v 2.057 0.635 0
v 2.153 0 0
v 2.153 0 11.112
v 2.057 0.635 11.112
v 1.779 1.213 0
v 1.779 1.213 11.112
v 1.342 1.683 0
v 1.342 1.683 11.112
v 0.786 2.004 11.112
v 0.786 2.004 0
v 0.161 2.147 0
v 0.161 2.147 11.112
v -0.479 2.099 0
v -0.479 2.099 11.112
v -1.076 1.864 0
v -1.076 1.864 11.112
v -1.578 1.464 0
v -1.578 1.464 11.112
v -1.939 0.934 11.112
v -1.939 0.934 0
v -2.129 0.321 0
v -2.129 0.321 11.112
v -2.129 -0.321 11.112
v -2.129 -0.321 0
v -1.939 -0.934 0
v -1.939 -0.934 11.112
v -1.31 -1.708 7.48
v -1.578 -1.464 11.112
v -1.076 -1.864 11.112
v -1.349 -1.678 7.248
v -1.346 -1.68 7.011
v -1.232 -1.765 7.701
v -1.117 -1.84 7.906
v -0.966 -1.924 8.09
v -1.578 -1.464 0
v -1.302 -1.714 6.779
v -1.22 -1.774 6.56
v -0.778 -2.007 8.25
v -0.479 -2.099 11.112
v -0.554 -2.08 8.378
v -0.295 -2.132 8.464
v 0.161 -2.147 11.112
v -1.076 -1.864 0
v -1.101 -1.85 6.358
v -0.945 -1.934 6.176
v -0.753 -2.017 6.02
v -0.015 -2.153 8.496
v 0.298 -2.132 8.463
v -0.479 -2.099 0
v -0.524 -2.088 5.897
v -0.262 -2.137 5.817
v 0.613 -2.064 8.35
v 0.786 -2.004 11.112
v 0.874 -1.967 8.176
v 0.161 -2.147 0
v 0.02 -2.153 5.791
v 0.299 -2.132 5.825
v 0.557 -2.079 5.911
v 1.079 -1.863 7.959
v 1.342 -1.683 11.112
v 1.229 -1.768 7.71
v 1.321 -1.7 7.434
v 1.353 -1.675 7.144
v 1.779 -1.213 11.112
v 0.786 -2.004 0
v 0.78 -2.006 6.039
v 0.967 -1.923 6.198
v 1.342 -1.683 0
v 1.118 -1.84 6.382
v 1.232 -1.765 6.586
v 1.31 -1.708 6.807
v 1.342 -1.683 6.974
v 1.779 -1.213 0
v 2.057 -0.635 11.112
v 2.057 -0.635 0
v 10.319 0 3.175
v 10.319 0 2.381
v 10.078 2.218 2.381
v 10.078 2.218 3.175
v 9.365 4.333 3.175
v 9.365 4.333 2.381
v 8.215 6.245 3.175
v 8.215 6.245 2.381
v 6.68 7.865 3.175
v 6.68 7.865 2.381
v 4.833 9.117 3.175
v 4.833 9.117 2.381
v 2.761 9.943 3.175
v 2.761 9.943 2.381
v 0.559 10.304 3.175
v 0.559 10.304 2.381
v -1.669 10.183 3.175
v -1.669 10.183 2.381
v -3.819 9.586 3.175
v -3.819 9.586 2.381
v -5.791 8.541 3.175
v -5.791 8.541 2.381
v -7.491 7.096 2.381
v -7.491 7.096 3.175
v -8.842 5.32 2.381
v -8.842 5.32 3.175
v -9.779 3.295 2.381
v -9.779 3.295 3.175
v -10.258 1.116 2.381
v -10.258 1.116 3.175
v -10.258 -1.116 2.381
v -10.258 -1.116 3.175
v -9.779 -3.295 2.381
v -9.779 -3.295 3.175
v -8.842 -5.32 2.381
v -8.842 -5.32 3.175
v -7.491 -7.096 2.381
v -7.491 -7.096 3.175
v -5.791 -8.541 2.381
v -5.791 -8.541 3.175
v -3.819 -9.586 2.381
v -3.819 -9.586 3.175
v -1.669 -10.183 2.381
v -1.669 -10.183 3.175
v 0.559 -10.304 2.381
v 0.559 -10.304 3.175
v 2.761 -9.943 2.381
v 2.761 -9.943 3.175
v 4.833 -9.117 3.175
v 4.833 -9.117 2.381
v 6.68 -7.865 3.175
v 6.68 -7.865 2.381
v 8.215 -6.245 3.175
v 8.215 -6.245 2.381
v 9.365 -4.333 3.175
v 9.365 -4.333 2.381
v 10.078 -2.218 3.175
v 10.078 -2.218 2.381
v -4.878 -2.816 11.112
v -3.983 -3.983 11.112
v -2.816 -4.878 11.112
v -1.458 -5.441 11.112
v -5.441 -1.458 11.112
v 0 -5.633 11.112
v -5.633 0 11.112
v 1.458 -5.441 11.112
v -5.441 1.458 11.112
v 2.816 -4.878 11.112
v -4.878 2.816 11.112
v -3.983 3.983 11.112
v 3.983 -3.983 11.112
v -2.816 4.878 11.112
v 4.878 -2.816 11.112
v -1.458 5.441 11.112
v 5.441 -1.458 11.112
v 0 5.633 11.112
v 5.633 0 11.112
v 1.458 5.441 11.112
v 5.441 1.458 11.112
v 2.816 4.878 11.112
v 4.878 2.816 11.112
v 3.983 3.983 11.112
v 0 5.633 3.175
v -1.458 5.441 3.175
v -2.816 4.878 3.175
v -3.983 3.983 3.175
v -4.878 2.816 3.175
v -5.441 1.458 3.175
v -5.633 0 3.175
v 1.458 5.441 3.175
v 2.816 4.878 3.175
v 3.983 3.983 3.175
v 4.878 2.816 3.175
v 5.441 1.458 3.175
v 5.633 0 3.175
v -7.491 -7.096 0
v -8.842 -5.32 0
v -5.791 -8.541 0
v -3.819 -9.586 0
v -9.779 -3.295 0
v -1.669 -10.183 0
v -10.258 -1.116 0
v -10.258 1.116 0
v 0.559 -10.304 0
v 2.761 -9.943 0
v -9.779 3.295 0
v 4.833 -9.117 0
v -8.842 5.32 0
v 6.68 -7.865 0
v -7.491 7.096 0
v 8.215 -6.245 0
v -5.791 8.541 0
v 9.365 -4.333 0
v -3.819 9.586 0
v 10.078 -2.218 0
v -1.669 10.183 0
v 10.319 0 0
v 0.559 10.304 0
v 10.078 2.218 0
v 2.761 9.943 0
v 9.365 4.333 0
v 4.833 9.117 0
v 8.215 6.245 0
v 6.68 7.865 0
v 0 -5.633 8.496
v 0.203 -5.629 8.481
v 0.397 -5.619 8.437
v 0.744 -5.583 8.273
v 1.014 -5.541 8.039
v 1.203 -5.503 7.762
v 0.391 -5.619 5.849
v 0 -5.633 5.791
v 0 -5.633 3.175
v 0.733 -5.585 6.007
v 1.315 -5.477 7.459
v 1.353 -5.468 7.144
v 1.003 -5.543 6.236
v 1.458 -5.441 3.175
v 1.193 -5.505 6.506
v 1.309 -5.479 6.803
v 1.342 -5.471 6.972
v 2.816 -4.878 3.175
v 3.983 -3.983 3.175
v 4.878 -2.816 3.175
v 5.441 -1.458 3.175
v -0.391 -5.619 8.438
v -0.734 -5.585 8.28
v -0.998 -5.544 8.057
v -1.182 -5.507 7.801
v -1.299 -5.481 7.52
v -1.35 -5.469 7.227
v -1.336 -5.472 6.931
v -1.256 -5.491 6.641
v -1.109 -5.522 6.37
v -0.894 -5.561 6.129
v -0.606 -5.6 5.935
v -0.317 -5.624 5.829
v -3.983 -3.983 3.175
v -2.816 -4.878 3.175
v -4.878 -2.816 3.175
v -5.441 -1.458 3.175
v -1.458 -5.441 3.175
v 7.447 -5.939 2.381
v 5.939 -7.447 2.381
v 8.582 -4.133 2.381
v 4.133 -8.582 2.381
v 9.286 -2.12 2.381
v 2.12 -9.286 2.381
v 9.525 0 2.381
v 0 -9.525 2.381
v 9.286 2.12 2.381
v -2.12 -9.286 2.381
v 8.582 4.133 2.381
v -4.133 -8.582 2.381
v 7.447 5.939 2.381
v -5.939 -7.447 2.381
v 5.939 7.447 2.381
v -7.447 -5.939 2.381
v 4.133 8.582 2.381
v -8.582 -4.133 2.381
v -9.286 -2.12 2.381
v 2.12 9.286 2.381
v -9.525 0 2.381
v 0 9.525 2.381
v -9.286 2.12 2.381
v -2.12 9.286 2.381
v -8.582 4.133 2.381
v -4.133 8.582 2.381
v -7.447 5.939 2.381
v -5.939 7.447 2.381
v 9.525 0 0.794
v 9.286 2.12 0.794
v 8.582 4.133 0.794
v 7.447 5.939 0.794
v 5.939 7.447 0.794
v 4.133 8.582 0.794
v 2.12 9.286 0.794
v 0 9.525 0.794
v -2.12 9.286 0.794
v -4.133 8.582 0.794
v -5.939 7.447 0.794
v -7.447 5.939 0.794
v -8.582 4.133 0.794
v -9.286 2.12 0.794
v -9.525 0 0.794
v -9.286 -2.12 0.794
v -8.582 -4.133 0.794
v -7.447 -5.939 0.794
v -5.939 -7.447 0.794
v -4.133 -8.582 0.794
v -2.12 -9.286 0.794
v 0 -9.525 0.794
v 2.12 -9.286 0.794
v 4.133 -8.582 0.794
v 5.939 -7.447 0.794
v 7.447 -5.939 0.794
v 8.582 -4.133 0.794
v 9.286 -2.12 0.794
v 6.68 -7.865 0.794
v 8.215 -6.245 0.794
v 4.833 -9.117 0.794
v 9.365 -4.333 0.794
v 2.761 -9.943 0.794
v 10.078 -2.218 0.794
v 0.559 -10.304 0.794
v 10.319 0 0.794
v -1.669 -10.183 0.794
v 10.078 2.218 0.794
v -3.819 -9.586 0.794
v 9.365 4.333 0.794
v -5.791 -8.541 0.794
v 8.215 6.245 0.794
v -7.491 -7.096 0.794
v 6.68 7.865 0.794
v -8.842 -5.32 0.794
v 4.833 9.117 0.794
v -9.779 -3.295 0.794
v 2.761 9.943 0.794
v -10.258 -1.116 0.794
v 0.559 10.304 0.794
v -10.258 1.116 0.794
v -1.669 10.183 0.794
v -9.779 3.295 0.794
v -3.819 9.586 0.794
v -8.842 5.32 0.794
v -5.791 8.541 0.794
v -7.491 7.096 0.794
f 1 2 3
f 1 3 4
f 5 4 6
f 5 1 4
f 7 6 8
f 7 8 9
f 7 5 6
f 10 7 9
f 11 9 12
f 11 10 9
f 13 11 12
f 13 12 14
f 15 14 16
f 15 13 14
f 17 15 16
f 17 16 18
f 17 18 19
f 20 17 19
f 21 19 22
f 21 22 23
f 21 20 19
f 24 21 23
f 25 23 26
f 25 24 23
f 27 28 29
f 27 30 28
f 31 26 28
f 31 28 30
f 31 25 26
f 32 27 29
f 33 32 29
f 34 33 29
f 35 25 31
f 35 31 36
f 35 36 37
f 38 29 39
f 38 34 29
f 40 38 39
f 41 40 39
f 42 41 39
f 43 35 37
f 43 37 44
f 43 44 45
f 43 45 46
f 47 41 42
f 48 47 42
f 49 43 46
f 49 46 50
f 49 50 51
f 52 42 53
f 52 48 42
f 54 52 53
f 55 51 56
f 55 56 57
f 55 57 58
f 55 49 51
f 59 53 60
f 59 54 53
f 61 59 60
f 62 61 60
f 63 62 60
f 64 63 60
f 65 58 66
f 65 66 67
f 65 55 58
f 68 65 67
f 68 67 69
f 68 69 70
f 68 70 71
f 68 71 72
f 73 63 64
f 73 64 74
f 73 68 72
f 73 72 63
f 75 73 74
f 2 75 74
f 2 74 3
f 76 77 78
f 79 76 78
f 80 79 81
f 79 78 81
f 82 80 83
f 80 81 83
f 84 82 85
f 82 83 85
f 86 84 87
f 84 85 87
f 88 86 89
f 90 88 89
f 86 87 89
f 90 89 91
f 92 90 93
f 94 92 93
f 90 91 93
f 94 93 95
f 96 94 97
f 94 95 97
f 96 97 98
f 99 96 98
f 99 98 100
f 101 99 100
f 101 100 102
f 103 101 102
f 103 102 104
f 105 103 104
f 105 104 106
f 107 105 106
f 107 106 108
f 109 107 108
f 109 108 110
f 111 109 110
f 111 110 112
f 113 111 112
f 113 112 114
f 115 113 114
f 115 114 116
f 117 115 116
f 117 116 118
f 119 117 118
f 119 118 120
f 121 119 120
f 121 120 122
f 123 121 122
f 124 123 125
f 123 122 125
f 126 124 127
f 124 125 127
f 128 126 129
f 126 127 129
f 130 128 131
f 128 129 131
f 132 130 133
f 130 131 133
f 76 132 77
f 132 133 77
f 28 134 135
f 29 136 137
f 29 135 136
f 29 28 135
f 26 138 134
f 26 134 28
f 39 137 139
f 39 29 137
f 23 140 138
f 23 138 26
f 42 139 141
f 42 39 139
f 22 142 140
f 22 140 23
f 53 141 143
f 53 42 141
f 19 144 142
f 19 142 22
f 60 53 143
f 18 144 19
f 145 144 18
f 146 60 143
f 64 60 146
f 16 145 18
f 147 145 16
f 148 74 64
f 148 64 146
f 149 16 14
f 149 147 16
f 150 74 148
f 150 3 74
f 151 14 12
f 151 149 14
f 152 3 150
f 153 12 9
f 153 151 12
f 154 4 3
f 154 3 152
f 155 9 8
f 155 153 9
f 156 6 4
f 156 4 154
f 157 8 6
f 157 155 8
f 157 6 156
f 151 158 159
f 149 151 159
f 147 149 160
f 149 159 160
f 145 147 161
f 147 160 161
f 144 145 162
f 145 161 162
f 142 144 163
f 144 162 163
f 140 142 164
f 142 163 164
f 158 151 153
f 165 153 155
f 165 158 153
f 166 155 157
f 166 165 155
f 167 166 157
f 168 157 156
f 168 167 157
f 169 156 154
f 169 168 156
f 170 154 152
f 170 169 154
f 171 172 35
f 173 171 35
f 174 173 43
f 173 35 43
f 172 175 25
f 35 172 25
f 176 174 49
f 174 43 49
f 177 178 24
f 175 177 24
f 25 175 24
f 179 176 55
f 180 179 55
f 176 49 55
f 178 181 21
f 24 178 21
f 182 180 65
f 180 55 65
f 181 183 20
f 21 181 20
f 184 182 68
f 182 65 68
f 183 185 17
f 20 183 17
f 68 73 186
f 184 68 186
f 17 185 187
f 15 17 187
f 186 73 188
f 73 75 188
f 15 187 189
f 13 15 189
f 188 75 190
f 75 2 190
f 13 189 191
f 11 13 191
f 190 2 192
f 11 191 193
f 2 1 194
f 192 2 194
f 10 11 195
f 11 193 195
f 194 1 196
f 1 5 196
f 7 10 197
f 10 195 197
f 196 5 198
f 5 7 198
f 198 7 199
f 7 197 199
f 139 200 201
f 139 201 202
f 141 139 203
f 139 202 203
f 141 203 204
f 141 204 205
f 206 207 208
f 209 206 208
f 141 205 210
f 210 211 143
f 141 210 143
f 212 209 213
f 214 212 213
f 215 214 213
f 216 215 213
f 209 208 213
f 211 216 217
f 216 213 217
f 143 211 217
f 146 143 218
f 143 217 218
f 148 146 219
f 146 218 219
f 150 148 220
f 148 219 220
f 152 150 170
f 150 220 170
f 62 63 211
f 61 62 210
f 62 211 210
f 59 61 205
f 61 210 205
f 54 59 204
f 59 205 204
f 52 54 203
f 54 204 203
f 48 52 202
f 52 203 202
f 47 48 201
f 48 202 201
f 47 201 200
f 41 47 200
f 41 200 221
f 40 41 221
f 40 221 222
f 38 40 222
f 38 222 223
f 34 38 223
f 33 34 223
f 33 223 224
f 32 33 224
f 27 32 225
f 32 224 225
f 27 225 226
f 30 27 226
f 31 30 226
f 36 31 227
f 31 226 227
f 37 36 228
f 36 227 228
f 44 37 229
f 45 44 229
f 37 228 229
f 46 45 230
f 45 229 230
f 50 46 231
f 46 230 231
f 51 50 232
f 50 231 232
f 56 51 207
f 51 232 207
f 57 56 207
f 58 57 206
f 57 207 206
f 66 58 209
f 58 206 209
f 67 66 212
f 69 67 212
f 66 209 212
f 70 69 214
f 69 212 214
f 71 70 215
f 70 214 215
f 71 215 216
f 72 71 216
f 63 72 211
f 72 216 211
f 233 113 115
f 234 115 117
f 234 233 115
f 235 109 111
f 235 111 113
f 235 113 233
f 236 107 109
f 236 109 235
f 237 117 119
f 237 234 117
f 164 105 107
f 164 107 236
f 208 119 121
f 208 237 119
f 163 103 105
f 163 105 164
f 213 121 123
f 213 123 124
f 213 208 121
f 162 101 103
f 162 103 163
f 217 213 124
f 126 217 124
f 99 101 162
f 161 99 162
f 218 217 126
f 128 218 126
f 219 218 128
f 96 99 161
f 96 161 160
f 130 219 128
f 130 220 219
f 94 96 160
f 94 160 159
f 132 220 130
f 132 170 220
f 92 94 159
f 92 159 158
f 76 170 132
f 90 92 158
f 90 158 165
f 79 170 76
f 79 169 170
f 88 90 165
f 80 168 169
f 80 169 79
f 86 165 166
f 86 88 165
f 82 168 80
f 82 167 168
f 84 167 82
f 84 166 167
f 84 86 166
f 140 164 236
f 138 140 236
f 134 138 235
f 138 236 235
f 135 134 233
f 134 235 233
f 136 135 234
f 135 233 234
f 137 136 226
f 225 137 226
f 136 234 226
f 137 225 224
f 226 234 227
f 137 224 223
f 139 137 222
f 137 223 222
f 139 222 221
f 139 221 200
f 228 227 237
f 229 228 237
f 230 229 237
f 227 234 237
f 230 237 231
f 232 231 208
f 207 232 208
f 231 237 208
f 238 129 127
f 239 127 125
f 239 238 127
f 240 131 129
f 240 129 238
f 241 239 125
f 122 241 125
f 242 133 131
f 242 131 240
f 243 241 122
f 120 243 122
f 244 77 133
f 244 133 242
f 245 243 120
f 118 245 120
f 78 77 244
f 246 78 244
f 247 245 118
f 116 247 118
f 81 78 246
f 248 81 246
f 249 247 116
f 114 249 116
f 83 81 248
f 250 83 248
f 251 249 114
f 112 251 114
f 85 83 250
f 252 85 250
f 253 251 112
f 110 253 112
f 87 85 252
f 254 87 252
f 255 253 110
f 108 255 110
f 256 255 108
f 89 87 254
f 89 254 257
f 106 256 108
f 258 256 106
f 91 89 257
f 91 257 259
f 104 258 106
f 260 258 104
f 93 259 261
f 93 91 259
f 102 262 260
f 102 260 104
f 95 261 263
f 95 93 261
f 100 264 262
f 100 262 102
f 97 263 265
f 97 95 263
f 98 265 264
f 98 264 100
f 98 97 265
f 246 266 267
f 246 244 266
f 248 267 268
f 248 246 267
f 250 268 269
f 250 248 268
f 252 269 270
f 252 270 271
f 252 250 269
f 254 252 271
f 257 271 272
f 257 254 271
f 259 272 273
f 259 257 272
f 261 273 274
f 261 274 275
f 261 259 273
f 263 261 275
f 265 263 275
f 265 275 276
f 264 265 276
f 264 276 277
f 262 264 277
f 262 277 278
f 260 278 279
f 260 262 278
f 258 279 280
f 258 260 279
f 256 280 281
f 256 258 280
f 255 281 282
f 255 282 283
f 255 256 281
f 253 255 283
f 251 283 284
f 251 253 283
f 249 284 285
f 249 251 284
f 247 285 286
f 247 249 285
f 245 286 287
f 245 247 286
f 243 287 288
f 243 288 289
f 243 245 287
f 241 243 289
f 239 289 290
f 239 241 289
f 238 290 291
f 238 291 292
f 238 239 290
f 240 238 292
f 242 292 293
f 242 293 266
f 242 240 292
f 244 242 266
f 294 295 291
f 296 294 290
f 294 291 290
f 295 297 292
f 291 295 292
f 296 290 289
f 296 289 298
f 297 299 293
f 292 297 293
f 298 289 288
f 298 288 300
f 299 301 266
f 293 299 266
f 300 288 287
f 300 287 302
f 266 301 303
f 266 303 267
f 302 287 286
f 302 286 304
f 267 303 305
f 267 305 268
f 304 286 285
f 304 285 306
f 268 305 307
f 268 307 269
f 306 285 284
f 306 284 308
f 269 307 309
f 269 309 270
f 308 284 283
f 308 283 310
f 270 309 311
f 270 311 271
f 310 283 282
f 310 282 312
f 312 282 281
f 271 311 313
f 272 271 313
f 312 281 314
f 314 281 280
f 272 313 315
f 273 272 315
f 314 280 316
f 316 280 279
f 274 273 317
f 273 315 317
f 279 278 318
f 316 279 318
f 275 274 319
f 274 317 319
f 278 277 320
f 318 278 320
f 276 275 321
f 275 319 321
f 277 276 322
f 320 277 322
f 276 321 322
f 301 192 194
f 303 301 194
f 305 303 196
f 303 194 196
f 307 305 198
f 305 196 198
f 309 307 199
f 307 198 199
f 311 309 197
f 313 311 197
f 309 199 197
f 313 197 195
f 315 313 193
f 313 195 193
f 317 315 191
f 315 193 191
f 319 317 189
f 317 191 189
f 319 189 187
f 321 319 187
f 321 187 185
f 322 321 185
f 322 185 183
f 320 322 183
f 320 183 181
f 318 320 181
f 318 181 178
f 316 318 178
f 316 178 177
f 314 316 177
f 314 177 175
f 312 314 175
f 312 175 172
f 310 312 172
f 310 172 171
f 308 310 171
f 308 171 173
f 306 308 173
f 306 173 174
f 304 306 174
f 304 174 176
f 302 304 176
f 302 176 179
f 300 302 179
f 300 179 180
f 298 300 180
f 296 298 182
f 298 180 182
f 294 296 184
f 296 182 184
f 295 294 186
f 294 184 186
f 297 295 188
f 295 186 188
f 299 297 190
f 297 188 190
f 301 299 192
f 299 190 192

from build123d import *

# Parameters (mm, degrees)
F0_R        = 10.31875
F0_R_2      = 2.15265
F1_DEPTH    = 3.175
F2_W        = 11.2655872395
F2_H        = 11.2655872395
F2_R        = 2.15265
F3_DEPTH    = 7.9375
F4_R        = 1.35255
F5_REACH    = 19.7781327273
F6_T1_DEPTH = 22.01948225
F7_W        = 0.79375
F7_H        = 1.5875


# Not quite as in the source:
# - a fillet or chamfer that OpenCascade refuses, or shapes differently, is made with other operations: its cross-section is extruded or revolved along the edge and cut away or added


with BuildPart() as f1:
    # F0 (on Top) → F1 (new body)
    with BuildSketch(Plane.XY):
        Circle(F0_R)
        Circle(F0_R_2, mode=Mode.SUBTRACT)
    extrude(amount=F1_DEPTH)

    # F2 (on face) → F3 (join)
    with BuildSketch(Plane.XY.offset(3.175)):
        Rectangle(F2_W, F2_H)
        Circle(F2_R, mode=Mode.SUBTRACT)
    extrude(amount=F3_DEPTH)

    f5_end = f1.faces().sort_by_distance((-2.15265, 0, 5.55625))[0]
    # F4 (on face) → F5 (cut, up to a face of the model that its end follows)
    with BuildSketch(Plane.XZ.offset(5.6327936197)):
        with Locations((0, 7.14375)):
            Circle(F4_R)
    f5_long = extrude(amount=-F5_REACH, mode=Mode.PRIVATE)
    add(split(f5_long, bisect_by=f5_end, keep=Keep.ALL, mode=Mode.PRIVATE).solids().sort_by_distance((0, -5.6327936197, 7.14375))[0], mode=Mode.SUBTRACT)

    # F6: fillet of radius 5.6327929 on 4 edges, made by hand

    # F6_s2 → F6_t1 (cut)
    with BuildSketch(Plane.XY.offset(3.175)):
        with BuildLine():
            ThreePointArc((-5.6327936197, -7.197e-07), (-3.9829867763, -3.9829867763), (-7.197e-07, -5.6327936197))
            Line((-7.197e-07, -5.6327936197), (-5.6327936197, -5.6327936197))
            Line((-5.6327936197, -5.6327936197), (-5.6327936197, -7.197e-07))
        make_face()
        with BuildLine():
            ThreePointArc((7.197e-07, -5.6327936197), (3.9829867763, -3.9829867763), (5.6327936197, -7.197e-07))
            Line((5.6327936197, -7.197e-07), (5.6327936197, -5.6327936197))
            Line((5.6327936197, -5.6327936197), (7.197e-07, -5.6327936197))
        make_face()
        with BuildLine():
            ThreePointArc((7.197e-07, 5.6327936197), (3.9829867763, 3.9829867763), (5.6327936197, 7.197e-07))
            Line((5.6327936197, 7.197e-07), (5.6327936197, 5.6327936197))
            Line((5.6327936197, 5.6327936197), (7.197e-07, 5.6327936197))
        make_face()
        with BuildLine():
            ThreePointArc((-7.197e-07, 5.6327936197), (-3.9829867763, 3.9829867763), (-5.6327936197, 7.197e-07))
            Line((-5.6327936197, 7.197e-07), (-5.6327936197, 5.6327936197))
            Line((-5.6327936197, 5.6327936197), (-7.197e-07, 5.6327936197))
        make_face()
    extrude(amount=F6_T1_DEPTH, mode=Mode.SUBTRACT)

    # F7 (on Front) → F8 (revolve, cut)
    with BuildSketch(Plane.XZ):
        with Locations((9.921875, 1.5875)):
            Rectangle(F7_W, F7_H)
    revolve(axis=Axis((0, 0, 0), (0, 0, 1)), mode=Mode.SUBTRACT)


solid = f1.part
